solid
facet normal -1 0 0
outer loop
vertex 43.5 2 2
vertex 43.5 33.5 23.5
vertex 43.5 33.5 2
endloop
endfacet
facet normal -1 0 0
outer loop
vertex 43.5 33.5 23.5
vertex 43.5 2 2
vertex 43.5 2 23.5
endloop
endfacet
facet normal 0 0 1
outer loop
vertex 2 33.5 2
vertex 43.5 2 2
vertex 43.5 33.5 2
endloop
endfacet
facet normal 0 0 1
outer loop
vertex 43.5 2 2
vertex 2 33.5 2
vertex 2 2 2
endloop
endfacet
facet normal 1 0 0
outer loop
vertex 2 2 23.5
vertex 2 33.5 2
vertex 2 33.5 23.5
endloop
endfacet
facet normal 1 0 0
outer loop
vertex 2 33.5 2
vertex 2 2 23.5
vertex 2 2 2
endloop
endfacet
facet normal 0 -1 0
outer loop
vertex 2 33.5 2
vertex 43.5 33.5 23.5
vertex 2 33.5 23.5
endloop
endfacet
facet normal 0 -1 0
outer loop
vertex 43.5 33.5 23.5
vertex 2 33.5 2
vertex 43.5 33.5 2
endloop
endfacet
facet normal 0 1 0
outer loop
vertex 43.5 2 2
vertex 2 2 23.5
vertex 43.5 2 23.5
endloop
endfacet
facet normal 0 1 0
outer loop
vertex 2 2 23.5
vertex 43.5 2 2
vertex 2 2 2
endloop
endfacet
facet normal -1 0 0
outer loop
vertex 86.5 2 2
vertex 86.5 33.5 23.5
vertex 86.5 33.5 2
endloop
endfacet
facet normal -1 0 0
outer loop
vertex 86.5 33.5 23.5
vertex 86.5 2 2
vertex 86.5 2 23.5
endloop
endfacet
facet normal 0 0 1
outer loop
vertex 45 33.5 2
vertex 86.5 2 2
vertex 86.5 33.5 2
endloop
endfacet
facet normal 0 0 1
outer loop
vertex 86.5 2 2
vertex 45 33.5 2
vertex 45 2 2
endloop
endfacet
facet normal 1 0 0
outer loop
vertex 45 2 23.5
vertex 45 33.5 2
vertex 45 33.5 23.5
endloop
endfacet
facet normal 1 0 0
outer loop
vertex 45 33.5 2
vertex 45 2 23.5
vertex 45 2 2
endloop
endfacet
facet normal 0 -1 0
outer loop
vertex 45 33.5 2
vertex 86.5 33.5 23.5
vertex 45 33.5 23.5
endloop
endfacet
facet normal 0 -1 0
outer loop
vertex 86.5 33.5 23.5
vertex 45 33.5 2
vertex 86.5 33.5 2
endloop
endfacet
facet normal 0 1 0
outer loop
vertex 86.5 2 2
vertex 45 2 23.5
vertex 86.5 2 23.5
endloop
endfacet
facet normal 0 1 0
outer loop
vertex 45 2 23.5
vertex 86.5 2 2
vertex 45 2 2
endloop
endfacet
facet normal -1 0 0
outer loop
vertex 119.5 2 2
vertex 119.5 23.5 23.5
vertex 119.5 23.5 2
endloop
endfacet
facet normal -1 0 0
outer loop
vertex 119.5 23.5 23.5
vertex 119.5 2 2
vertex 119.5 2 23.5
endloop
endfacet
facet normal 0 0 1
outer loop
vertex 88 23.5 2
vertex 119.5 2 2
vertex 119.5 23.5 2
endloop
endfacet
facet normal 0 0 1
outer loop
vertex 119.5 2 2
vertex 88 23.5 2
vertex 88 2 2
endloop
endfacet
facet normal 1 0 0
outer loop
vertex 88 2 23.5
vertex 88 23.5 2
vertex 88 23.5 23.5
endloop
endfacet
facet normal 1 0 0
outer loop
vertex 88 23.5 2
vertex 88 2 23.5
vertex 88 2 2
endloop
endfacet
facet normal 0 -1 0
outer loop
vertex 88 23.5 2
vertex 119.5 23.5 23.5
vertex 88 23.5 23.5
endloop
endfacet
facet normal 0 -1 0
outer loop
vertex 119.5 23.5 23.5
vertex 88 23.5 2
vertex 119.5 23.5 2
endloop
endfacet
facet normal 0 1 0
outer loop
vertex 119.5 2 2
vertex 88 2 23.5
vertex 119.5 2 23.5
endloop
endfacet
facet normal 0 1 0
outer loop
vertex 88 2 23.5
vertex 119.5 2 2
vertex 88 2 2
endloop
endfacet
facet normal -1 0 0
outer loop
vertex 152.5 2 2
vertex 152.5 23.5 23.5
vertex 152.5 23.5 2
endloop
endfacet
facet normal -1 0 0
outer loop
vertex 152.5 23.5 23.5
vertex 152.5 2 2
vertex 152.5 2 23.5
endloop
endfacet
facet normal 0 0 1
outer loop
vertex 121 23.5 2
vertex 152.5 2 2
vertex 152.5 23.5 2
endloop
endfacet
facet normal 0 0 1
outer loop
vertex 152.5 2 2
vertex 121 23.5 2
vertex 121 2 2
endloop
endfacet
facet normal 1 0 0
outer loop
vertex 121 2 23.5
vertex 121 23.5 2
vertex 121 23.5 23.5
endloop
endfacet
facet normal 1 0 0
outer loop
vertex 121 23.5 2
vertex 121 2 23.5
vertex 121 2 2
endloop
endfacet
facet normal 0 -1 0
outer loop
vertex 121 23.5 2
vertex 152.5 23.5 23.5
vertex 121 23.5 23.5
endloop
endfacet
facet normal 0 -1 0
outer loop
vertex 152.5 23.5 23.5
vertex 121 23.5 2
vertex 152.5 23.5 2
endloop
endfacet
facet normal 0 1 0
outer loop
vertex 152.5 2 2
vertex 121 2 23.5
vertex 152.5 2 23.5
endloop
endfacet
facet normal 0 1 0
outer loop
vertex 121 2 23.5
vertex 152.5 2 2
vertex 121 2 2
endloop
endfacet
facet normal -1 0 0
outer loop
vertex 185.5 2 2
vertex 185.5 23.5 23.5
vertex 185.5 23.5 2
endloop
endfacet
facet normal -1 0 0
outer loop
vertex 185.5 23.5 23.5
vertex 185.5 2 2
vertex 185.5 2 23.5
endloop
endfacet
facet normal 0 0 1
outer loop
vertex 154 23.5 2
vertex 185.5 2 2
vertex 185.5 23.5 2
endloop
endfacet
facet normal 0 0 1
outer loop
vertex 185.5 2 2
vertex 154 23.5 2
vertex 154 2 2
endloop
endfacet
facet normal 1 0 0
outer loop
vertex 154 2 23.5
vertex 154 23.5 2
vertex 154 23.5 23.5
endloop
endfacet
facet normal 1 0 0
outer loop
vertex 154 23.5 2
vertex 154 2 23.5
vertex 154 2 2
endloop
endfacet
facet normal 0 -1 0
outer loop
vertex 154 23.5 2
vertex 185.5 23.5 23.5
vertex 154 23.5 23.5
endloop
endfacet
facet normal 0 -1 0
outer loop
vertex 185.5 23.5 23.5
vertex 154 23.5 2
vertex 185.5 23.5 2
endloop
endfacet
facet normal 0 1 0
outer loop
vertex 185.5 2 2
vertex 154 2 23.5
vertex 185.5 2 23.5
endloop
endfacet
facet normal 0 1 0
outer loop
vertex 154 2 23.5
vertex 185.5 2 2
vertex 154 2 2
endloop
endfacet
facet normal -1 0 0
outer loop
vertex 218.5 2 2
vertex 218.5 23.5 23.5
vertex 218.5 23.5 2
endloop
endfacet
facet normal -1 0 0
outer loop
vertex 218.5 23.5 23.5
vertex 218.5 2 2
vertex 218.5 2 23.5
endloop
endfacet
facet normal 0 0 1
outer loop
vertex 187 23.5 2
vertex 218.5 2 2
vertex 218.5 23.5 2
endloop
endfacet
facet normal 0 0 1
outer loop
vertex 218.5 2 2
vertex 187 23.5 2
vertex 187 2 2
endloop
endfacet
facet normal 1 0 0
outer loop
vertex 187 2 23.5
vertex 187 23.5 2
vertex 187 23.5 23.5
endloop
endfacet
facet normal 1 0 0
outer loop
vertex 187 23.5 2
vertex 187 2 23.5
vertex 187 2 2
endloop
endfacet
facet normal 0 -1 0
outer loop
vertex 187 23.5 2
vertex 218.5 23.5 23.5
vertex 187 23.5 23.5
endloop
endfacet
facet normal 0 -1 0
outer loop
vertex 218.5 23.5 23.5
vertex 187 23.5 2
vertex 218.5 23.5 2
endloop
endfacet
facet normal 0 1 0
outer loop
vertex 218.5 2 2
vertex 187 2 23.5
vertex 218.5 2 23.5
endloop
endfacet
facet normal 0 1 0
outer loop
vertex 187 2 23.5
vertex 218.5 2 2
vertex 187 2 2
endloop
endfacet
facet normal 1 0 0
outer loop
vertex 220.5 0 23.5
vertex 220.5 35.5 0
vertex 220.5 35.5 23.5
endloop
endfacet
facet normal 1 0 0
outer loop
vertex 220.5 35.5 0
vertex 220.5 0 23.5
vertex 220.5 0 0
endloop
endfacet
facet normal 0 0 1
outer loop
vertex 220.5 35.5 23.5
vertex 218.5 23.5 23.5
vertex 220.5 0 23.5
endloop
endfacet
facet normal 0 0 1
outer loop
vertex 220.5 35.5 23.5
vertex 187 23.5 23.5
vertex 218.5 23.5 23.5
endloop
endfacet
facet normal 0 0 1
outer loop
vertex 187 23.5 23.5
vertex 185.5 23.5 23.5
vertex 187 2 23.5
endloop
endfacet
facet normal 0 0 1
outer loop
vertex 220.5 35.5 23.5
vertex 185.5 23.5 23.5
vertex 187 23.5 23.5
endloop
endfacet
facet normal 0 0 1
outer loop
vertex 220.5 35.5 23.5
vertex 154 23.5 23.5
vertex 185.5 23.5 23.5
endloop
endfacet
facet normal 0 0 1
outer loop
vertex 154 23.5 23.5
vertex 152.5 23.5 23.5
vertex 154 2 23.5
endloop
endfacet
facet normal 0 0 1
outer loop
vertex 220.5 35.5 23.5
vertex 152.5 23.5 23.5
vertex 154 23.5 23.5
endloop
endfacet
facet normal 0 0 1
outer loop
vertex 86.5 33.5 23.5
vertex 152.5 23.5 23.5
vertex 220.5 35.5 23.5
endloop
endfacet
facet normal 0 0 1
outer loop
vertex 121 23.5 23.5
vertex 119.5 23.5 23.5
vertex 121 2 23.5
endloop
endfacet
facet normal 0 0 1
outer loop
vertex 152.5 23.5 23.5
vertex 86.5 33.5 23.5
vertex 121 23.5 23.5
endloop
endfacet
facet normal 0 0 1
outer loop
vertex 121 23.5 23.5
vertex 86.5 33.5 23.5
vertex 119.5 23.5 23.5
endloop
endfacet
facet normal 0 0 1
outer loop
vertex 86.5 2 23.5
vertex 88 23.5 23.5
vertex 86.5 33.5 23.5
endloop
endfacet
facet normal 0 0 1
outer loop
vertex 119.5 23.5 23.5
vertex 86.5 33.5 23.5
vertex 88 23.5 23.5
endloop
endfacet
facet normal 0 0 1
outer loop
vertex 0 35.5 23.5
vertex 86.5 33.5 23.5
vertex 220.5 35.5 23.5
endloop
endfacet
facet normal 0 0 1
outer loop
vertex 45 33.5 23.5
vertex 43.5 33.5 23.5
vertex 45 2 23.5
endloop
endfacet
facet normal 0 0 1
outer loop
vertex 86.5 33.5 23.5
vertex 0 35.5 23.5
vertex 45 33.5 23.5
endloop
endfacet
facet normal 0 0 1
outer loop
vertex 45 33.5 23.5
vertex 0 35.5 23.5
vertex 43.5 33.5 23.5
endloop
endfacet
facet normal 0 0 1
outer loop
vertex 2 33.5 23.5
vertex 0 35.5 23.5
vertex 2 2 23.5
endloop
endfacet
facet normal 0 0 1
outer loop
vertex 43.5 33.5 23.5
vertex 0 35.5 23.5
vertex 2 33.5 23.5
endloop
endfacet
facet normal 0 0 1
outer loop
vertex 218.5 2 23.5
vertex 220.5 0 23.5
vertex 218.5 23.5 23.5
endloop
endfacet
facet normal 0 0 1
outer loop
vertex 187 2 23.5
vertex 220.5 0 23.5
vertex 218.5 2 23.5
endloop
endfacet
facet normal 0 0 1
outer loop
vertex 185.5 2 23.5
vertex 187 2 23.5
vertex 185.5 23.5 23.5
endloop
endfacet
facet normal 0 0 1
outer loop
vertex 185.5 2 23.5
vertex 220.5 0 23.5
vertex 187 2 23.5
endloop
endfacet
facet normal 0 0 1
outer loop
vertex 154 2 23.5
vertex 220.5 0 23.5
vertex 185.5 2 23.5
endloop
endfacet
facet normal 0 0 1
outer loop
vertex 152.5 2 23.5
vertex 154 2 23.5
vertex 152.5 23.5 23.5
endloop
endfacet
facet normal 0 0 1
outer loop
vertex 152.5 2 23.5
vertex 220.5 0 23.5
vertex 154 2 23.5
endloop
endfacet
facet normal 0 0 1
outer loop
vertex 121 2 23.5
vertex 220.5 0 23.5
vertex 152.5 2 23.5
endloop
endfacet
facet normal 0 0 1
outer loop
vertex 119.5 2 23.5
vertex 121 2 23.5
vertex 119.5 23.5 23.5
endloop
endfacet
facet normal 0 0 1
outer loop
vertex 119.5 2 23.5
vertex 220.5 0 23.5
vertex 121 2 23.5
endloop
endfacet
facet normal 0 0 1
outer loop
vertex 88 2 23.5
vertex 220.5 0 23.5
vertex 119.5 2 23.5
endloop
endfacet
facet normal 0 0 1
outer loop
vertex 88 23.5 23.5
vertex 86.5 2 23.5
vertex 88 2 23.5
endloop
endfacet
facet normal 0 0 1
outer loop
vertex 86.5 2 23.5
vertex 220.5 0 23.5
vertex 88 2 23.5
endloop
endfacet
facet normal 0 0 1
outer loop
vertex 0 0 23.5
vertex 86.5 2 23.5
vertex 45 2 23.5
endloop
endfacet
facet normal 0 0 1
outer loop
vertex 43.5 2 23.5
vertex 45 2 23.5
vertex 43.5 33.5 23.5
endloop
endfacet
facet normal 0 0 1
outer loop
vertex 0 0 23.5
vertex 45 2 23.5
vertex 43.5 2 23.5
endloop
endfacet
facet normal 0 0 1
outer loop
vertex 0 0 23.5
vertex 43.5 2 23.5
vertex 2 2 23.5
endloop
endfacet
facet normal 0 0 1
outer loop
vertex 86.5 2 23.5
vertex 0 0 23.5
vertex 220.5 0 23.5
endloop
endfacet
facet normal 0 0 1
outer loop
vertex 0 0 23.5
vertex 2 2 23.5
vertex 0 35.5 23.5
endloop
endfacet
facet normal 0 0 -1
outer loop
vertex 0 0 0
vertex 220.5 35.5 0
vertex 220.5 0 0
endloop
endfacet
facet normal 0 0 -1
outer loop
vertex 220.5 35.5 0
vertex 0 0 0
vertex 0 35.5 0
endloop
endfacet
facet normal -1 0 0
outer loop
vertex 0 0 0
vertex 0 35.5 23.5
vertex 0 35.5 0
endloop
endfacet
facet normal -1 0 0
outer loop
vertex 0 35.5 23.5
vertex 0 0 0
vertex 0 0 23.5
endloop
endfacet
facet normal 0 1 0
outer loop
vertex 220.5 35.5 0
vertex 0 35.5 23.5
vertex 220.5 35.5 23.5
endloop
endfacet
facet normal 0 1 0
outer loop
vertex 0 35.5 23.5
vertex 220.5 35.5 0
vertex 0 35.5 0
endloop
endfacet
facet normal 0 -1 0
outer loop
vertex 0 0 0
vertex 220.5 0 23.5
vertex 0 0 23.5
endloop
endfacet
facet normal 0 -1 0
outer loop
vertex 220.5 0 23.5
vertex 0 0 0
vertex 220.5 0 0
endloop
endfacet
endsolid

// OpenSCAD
// Generated by SolidPython 1.1.3 on 2026-02-21 17:56:22


difference() {
	cube(size = [220.5000000000, 35.5000000000, 23.5000000000]);
	union() {
		translate(v = [2.0000000000, 2.0000000000, 2.0000000000]) {
			cube(size = [41.5000000000, 31.5000000000, 21.5100000000]);
		}
		translate(v = [45.0000000000, 2.0000000000, 2.0000000000]) {
			cube(size = [41.5000000000, 31.5000000000, 21.5100000000]);
		}
		translate(v = [88.0000000000, 2.0000000000, 2.0000000000]) {
			cube(size = [31.5000000000, 21.5000000000, 21.5100000000]);
		}
		translate(v = [121.0000000000, 2.0000000000, 2.0000000000]) {
			cube(size = [31.5000000000, 21.5000000000, 21.5100000000]);
		}
		translate(v = [154.0000000000, 2.0000000000, 2.0000000000]) {
			cube(size = [31.5000000000, 21.5000000000, 21.5100000000]);
		}
		translate(v = [187.0000000000, 2.0000000000, 2.0000000000]) {
			cube(size = [31.5000000000, 21.5000000000, 21.5100000000]);
		}
	}
}
/***********************************************
*********      SolidPython code:      **********
************************************************
 
"""SolidPython geometry building for storage cases."""

from typing import List, Union

from solid import cube, difference, scad_render_to_file, translate, union

from .config import Config
from .layout import GridLayoutResult, MixedLayoutResult, SlotRect


def build_base_tray(
    slots: List[SlotRect],
    total_width: float,
    total_length: float,
    config: Config,
):
    """Build the solid base tray (floor + perimeter walls) with slot cavities subtracted."""
    wall = config.wall_thickness
    base_h = config.base_height
    max_height = max(s.height for s in slots)

    outer_x = total_width + 2 * wall
    outer_y = total_length + 2 * wall
    outer_z = base_h + max_height

    outer_box = cube([outer_x, outer_y, outer_z])

    # Subtract each slot cavity (use uniform depth so all slots are clearly visible)
    cavities = []
    for slot in slots:
        cavity = translate([wall + slot.x, wall + slot.y, base_h])(
            cube([slot.width, slot.length, max_height + 0.01])  # +epsilon for clean cut
        )
        cavities.append(cavity)

    if cavities:
        tray = difference()(outer_box, union()(*cavities))
    else:
        tray = outer_box

    return tray


def assemble_case(
    layout_result: Union[GridLayoutResult, MixedLayoutResult],
    config: Config,
):
    """Assemble the complete case: base tray with slot cavities (dividers are implicit)."""
    slots = layout_result.slots
    total_width = layout_result.total_width
    total_length = layout_result.total_length

    case = build_base_tray(slots, total_width, total_length, config)
    return case


def render_to_file(assembly, filepath: str) -> None:
    """Render the assembly to an OpenSCAD .scad file."""
    scad_render_to_file(assembly, filepath)
 
 
************************************************/
